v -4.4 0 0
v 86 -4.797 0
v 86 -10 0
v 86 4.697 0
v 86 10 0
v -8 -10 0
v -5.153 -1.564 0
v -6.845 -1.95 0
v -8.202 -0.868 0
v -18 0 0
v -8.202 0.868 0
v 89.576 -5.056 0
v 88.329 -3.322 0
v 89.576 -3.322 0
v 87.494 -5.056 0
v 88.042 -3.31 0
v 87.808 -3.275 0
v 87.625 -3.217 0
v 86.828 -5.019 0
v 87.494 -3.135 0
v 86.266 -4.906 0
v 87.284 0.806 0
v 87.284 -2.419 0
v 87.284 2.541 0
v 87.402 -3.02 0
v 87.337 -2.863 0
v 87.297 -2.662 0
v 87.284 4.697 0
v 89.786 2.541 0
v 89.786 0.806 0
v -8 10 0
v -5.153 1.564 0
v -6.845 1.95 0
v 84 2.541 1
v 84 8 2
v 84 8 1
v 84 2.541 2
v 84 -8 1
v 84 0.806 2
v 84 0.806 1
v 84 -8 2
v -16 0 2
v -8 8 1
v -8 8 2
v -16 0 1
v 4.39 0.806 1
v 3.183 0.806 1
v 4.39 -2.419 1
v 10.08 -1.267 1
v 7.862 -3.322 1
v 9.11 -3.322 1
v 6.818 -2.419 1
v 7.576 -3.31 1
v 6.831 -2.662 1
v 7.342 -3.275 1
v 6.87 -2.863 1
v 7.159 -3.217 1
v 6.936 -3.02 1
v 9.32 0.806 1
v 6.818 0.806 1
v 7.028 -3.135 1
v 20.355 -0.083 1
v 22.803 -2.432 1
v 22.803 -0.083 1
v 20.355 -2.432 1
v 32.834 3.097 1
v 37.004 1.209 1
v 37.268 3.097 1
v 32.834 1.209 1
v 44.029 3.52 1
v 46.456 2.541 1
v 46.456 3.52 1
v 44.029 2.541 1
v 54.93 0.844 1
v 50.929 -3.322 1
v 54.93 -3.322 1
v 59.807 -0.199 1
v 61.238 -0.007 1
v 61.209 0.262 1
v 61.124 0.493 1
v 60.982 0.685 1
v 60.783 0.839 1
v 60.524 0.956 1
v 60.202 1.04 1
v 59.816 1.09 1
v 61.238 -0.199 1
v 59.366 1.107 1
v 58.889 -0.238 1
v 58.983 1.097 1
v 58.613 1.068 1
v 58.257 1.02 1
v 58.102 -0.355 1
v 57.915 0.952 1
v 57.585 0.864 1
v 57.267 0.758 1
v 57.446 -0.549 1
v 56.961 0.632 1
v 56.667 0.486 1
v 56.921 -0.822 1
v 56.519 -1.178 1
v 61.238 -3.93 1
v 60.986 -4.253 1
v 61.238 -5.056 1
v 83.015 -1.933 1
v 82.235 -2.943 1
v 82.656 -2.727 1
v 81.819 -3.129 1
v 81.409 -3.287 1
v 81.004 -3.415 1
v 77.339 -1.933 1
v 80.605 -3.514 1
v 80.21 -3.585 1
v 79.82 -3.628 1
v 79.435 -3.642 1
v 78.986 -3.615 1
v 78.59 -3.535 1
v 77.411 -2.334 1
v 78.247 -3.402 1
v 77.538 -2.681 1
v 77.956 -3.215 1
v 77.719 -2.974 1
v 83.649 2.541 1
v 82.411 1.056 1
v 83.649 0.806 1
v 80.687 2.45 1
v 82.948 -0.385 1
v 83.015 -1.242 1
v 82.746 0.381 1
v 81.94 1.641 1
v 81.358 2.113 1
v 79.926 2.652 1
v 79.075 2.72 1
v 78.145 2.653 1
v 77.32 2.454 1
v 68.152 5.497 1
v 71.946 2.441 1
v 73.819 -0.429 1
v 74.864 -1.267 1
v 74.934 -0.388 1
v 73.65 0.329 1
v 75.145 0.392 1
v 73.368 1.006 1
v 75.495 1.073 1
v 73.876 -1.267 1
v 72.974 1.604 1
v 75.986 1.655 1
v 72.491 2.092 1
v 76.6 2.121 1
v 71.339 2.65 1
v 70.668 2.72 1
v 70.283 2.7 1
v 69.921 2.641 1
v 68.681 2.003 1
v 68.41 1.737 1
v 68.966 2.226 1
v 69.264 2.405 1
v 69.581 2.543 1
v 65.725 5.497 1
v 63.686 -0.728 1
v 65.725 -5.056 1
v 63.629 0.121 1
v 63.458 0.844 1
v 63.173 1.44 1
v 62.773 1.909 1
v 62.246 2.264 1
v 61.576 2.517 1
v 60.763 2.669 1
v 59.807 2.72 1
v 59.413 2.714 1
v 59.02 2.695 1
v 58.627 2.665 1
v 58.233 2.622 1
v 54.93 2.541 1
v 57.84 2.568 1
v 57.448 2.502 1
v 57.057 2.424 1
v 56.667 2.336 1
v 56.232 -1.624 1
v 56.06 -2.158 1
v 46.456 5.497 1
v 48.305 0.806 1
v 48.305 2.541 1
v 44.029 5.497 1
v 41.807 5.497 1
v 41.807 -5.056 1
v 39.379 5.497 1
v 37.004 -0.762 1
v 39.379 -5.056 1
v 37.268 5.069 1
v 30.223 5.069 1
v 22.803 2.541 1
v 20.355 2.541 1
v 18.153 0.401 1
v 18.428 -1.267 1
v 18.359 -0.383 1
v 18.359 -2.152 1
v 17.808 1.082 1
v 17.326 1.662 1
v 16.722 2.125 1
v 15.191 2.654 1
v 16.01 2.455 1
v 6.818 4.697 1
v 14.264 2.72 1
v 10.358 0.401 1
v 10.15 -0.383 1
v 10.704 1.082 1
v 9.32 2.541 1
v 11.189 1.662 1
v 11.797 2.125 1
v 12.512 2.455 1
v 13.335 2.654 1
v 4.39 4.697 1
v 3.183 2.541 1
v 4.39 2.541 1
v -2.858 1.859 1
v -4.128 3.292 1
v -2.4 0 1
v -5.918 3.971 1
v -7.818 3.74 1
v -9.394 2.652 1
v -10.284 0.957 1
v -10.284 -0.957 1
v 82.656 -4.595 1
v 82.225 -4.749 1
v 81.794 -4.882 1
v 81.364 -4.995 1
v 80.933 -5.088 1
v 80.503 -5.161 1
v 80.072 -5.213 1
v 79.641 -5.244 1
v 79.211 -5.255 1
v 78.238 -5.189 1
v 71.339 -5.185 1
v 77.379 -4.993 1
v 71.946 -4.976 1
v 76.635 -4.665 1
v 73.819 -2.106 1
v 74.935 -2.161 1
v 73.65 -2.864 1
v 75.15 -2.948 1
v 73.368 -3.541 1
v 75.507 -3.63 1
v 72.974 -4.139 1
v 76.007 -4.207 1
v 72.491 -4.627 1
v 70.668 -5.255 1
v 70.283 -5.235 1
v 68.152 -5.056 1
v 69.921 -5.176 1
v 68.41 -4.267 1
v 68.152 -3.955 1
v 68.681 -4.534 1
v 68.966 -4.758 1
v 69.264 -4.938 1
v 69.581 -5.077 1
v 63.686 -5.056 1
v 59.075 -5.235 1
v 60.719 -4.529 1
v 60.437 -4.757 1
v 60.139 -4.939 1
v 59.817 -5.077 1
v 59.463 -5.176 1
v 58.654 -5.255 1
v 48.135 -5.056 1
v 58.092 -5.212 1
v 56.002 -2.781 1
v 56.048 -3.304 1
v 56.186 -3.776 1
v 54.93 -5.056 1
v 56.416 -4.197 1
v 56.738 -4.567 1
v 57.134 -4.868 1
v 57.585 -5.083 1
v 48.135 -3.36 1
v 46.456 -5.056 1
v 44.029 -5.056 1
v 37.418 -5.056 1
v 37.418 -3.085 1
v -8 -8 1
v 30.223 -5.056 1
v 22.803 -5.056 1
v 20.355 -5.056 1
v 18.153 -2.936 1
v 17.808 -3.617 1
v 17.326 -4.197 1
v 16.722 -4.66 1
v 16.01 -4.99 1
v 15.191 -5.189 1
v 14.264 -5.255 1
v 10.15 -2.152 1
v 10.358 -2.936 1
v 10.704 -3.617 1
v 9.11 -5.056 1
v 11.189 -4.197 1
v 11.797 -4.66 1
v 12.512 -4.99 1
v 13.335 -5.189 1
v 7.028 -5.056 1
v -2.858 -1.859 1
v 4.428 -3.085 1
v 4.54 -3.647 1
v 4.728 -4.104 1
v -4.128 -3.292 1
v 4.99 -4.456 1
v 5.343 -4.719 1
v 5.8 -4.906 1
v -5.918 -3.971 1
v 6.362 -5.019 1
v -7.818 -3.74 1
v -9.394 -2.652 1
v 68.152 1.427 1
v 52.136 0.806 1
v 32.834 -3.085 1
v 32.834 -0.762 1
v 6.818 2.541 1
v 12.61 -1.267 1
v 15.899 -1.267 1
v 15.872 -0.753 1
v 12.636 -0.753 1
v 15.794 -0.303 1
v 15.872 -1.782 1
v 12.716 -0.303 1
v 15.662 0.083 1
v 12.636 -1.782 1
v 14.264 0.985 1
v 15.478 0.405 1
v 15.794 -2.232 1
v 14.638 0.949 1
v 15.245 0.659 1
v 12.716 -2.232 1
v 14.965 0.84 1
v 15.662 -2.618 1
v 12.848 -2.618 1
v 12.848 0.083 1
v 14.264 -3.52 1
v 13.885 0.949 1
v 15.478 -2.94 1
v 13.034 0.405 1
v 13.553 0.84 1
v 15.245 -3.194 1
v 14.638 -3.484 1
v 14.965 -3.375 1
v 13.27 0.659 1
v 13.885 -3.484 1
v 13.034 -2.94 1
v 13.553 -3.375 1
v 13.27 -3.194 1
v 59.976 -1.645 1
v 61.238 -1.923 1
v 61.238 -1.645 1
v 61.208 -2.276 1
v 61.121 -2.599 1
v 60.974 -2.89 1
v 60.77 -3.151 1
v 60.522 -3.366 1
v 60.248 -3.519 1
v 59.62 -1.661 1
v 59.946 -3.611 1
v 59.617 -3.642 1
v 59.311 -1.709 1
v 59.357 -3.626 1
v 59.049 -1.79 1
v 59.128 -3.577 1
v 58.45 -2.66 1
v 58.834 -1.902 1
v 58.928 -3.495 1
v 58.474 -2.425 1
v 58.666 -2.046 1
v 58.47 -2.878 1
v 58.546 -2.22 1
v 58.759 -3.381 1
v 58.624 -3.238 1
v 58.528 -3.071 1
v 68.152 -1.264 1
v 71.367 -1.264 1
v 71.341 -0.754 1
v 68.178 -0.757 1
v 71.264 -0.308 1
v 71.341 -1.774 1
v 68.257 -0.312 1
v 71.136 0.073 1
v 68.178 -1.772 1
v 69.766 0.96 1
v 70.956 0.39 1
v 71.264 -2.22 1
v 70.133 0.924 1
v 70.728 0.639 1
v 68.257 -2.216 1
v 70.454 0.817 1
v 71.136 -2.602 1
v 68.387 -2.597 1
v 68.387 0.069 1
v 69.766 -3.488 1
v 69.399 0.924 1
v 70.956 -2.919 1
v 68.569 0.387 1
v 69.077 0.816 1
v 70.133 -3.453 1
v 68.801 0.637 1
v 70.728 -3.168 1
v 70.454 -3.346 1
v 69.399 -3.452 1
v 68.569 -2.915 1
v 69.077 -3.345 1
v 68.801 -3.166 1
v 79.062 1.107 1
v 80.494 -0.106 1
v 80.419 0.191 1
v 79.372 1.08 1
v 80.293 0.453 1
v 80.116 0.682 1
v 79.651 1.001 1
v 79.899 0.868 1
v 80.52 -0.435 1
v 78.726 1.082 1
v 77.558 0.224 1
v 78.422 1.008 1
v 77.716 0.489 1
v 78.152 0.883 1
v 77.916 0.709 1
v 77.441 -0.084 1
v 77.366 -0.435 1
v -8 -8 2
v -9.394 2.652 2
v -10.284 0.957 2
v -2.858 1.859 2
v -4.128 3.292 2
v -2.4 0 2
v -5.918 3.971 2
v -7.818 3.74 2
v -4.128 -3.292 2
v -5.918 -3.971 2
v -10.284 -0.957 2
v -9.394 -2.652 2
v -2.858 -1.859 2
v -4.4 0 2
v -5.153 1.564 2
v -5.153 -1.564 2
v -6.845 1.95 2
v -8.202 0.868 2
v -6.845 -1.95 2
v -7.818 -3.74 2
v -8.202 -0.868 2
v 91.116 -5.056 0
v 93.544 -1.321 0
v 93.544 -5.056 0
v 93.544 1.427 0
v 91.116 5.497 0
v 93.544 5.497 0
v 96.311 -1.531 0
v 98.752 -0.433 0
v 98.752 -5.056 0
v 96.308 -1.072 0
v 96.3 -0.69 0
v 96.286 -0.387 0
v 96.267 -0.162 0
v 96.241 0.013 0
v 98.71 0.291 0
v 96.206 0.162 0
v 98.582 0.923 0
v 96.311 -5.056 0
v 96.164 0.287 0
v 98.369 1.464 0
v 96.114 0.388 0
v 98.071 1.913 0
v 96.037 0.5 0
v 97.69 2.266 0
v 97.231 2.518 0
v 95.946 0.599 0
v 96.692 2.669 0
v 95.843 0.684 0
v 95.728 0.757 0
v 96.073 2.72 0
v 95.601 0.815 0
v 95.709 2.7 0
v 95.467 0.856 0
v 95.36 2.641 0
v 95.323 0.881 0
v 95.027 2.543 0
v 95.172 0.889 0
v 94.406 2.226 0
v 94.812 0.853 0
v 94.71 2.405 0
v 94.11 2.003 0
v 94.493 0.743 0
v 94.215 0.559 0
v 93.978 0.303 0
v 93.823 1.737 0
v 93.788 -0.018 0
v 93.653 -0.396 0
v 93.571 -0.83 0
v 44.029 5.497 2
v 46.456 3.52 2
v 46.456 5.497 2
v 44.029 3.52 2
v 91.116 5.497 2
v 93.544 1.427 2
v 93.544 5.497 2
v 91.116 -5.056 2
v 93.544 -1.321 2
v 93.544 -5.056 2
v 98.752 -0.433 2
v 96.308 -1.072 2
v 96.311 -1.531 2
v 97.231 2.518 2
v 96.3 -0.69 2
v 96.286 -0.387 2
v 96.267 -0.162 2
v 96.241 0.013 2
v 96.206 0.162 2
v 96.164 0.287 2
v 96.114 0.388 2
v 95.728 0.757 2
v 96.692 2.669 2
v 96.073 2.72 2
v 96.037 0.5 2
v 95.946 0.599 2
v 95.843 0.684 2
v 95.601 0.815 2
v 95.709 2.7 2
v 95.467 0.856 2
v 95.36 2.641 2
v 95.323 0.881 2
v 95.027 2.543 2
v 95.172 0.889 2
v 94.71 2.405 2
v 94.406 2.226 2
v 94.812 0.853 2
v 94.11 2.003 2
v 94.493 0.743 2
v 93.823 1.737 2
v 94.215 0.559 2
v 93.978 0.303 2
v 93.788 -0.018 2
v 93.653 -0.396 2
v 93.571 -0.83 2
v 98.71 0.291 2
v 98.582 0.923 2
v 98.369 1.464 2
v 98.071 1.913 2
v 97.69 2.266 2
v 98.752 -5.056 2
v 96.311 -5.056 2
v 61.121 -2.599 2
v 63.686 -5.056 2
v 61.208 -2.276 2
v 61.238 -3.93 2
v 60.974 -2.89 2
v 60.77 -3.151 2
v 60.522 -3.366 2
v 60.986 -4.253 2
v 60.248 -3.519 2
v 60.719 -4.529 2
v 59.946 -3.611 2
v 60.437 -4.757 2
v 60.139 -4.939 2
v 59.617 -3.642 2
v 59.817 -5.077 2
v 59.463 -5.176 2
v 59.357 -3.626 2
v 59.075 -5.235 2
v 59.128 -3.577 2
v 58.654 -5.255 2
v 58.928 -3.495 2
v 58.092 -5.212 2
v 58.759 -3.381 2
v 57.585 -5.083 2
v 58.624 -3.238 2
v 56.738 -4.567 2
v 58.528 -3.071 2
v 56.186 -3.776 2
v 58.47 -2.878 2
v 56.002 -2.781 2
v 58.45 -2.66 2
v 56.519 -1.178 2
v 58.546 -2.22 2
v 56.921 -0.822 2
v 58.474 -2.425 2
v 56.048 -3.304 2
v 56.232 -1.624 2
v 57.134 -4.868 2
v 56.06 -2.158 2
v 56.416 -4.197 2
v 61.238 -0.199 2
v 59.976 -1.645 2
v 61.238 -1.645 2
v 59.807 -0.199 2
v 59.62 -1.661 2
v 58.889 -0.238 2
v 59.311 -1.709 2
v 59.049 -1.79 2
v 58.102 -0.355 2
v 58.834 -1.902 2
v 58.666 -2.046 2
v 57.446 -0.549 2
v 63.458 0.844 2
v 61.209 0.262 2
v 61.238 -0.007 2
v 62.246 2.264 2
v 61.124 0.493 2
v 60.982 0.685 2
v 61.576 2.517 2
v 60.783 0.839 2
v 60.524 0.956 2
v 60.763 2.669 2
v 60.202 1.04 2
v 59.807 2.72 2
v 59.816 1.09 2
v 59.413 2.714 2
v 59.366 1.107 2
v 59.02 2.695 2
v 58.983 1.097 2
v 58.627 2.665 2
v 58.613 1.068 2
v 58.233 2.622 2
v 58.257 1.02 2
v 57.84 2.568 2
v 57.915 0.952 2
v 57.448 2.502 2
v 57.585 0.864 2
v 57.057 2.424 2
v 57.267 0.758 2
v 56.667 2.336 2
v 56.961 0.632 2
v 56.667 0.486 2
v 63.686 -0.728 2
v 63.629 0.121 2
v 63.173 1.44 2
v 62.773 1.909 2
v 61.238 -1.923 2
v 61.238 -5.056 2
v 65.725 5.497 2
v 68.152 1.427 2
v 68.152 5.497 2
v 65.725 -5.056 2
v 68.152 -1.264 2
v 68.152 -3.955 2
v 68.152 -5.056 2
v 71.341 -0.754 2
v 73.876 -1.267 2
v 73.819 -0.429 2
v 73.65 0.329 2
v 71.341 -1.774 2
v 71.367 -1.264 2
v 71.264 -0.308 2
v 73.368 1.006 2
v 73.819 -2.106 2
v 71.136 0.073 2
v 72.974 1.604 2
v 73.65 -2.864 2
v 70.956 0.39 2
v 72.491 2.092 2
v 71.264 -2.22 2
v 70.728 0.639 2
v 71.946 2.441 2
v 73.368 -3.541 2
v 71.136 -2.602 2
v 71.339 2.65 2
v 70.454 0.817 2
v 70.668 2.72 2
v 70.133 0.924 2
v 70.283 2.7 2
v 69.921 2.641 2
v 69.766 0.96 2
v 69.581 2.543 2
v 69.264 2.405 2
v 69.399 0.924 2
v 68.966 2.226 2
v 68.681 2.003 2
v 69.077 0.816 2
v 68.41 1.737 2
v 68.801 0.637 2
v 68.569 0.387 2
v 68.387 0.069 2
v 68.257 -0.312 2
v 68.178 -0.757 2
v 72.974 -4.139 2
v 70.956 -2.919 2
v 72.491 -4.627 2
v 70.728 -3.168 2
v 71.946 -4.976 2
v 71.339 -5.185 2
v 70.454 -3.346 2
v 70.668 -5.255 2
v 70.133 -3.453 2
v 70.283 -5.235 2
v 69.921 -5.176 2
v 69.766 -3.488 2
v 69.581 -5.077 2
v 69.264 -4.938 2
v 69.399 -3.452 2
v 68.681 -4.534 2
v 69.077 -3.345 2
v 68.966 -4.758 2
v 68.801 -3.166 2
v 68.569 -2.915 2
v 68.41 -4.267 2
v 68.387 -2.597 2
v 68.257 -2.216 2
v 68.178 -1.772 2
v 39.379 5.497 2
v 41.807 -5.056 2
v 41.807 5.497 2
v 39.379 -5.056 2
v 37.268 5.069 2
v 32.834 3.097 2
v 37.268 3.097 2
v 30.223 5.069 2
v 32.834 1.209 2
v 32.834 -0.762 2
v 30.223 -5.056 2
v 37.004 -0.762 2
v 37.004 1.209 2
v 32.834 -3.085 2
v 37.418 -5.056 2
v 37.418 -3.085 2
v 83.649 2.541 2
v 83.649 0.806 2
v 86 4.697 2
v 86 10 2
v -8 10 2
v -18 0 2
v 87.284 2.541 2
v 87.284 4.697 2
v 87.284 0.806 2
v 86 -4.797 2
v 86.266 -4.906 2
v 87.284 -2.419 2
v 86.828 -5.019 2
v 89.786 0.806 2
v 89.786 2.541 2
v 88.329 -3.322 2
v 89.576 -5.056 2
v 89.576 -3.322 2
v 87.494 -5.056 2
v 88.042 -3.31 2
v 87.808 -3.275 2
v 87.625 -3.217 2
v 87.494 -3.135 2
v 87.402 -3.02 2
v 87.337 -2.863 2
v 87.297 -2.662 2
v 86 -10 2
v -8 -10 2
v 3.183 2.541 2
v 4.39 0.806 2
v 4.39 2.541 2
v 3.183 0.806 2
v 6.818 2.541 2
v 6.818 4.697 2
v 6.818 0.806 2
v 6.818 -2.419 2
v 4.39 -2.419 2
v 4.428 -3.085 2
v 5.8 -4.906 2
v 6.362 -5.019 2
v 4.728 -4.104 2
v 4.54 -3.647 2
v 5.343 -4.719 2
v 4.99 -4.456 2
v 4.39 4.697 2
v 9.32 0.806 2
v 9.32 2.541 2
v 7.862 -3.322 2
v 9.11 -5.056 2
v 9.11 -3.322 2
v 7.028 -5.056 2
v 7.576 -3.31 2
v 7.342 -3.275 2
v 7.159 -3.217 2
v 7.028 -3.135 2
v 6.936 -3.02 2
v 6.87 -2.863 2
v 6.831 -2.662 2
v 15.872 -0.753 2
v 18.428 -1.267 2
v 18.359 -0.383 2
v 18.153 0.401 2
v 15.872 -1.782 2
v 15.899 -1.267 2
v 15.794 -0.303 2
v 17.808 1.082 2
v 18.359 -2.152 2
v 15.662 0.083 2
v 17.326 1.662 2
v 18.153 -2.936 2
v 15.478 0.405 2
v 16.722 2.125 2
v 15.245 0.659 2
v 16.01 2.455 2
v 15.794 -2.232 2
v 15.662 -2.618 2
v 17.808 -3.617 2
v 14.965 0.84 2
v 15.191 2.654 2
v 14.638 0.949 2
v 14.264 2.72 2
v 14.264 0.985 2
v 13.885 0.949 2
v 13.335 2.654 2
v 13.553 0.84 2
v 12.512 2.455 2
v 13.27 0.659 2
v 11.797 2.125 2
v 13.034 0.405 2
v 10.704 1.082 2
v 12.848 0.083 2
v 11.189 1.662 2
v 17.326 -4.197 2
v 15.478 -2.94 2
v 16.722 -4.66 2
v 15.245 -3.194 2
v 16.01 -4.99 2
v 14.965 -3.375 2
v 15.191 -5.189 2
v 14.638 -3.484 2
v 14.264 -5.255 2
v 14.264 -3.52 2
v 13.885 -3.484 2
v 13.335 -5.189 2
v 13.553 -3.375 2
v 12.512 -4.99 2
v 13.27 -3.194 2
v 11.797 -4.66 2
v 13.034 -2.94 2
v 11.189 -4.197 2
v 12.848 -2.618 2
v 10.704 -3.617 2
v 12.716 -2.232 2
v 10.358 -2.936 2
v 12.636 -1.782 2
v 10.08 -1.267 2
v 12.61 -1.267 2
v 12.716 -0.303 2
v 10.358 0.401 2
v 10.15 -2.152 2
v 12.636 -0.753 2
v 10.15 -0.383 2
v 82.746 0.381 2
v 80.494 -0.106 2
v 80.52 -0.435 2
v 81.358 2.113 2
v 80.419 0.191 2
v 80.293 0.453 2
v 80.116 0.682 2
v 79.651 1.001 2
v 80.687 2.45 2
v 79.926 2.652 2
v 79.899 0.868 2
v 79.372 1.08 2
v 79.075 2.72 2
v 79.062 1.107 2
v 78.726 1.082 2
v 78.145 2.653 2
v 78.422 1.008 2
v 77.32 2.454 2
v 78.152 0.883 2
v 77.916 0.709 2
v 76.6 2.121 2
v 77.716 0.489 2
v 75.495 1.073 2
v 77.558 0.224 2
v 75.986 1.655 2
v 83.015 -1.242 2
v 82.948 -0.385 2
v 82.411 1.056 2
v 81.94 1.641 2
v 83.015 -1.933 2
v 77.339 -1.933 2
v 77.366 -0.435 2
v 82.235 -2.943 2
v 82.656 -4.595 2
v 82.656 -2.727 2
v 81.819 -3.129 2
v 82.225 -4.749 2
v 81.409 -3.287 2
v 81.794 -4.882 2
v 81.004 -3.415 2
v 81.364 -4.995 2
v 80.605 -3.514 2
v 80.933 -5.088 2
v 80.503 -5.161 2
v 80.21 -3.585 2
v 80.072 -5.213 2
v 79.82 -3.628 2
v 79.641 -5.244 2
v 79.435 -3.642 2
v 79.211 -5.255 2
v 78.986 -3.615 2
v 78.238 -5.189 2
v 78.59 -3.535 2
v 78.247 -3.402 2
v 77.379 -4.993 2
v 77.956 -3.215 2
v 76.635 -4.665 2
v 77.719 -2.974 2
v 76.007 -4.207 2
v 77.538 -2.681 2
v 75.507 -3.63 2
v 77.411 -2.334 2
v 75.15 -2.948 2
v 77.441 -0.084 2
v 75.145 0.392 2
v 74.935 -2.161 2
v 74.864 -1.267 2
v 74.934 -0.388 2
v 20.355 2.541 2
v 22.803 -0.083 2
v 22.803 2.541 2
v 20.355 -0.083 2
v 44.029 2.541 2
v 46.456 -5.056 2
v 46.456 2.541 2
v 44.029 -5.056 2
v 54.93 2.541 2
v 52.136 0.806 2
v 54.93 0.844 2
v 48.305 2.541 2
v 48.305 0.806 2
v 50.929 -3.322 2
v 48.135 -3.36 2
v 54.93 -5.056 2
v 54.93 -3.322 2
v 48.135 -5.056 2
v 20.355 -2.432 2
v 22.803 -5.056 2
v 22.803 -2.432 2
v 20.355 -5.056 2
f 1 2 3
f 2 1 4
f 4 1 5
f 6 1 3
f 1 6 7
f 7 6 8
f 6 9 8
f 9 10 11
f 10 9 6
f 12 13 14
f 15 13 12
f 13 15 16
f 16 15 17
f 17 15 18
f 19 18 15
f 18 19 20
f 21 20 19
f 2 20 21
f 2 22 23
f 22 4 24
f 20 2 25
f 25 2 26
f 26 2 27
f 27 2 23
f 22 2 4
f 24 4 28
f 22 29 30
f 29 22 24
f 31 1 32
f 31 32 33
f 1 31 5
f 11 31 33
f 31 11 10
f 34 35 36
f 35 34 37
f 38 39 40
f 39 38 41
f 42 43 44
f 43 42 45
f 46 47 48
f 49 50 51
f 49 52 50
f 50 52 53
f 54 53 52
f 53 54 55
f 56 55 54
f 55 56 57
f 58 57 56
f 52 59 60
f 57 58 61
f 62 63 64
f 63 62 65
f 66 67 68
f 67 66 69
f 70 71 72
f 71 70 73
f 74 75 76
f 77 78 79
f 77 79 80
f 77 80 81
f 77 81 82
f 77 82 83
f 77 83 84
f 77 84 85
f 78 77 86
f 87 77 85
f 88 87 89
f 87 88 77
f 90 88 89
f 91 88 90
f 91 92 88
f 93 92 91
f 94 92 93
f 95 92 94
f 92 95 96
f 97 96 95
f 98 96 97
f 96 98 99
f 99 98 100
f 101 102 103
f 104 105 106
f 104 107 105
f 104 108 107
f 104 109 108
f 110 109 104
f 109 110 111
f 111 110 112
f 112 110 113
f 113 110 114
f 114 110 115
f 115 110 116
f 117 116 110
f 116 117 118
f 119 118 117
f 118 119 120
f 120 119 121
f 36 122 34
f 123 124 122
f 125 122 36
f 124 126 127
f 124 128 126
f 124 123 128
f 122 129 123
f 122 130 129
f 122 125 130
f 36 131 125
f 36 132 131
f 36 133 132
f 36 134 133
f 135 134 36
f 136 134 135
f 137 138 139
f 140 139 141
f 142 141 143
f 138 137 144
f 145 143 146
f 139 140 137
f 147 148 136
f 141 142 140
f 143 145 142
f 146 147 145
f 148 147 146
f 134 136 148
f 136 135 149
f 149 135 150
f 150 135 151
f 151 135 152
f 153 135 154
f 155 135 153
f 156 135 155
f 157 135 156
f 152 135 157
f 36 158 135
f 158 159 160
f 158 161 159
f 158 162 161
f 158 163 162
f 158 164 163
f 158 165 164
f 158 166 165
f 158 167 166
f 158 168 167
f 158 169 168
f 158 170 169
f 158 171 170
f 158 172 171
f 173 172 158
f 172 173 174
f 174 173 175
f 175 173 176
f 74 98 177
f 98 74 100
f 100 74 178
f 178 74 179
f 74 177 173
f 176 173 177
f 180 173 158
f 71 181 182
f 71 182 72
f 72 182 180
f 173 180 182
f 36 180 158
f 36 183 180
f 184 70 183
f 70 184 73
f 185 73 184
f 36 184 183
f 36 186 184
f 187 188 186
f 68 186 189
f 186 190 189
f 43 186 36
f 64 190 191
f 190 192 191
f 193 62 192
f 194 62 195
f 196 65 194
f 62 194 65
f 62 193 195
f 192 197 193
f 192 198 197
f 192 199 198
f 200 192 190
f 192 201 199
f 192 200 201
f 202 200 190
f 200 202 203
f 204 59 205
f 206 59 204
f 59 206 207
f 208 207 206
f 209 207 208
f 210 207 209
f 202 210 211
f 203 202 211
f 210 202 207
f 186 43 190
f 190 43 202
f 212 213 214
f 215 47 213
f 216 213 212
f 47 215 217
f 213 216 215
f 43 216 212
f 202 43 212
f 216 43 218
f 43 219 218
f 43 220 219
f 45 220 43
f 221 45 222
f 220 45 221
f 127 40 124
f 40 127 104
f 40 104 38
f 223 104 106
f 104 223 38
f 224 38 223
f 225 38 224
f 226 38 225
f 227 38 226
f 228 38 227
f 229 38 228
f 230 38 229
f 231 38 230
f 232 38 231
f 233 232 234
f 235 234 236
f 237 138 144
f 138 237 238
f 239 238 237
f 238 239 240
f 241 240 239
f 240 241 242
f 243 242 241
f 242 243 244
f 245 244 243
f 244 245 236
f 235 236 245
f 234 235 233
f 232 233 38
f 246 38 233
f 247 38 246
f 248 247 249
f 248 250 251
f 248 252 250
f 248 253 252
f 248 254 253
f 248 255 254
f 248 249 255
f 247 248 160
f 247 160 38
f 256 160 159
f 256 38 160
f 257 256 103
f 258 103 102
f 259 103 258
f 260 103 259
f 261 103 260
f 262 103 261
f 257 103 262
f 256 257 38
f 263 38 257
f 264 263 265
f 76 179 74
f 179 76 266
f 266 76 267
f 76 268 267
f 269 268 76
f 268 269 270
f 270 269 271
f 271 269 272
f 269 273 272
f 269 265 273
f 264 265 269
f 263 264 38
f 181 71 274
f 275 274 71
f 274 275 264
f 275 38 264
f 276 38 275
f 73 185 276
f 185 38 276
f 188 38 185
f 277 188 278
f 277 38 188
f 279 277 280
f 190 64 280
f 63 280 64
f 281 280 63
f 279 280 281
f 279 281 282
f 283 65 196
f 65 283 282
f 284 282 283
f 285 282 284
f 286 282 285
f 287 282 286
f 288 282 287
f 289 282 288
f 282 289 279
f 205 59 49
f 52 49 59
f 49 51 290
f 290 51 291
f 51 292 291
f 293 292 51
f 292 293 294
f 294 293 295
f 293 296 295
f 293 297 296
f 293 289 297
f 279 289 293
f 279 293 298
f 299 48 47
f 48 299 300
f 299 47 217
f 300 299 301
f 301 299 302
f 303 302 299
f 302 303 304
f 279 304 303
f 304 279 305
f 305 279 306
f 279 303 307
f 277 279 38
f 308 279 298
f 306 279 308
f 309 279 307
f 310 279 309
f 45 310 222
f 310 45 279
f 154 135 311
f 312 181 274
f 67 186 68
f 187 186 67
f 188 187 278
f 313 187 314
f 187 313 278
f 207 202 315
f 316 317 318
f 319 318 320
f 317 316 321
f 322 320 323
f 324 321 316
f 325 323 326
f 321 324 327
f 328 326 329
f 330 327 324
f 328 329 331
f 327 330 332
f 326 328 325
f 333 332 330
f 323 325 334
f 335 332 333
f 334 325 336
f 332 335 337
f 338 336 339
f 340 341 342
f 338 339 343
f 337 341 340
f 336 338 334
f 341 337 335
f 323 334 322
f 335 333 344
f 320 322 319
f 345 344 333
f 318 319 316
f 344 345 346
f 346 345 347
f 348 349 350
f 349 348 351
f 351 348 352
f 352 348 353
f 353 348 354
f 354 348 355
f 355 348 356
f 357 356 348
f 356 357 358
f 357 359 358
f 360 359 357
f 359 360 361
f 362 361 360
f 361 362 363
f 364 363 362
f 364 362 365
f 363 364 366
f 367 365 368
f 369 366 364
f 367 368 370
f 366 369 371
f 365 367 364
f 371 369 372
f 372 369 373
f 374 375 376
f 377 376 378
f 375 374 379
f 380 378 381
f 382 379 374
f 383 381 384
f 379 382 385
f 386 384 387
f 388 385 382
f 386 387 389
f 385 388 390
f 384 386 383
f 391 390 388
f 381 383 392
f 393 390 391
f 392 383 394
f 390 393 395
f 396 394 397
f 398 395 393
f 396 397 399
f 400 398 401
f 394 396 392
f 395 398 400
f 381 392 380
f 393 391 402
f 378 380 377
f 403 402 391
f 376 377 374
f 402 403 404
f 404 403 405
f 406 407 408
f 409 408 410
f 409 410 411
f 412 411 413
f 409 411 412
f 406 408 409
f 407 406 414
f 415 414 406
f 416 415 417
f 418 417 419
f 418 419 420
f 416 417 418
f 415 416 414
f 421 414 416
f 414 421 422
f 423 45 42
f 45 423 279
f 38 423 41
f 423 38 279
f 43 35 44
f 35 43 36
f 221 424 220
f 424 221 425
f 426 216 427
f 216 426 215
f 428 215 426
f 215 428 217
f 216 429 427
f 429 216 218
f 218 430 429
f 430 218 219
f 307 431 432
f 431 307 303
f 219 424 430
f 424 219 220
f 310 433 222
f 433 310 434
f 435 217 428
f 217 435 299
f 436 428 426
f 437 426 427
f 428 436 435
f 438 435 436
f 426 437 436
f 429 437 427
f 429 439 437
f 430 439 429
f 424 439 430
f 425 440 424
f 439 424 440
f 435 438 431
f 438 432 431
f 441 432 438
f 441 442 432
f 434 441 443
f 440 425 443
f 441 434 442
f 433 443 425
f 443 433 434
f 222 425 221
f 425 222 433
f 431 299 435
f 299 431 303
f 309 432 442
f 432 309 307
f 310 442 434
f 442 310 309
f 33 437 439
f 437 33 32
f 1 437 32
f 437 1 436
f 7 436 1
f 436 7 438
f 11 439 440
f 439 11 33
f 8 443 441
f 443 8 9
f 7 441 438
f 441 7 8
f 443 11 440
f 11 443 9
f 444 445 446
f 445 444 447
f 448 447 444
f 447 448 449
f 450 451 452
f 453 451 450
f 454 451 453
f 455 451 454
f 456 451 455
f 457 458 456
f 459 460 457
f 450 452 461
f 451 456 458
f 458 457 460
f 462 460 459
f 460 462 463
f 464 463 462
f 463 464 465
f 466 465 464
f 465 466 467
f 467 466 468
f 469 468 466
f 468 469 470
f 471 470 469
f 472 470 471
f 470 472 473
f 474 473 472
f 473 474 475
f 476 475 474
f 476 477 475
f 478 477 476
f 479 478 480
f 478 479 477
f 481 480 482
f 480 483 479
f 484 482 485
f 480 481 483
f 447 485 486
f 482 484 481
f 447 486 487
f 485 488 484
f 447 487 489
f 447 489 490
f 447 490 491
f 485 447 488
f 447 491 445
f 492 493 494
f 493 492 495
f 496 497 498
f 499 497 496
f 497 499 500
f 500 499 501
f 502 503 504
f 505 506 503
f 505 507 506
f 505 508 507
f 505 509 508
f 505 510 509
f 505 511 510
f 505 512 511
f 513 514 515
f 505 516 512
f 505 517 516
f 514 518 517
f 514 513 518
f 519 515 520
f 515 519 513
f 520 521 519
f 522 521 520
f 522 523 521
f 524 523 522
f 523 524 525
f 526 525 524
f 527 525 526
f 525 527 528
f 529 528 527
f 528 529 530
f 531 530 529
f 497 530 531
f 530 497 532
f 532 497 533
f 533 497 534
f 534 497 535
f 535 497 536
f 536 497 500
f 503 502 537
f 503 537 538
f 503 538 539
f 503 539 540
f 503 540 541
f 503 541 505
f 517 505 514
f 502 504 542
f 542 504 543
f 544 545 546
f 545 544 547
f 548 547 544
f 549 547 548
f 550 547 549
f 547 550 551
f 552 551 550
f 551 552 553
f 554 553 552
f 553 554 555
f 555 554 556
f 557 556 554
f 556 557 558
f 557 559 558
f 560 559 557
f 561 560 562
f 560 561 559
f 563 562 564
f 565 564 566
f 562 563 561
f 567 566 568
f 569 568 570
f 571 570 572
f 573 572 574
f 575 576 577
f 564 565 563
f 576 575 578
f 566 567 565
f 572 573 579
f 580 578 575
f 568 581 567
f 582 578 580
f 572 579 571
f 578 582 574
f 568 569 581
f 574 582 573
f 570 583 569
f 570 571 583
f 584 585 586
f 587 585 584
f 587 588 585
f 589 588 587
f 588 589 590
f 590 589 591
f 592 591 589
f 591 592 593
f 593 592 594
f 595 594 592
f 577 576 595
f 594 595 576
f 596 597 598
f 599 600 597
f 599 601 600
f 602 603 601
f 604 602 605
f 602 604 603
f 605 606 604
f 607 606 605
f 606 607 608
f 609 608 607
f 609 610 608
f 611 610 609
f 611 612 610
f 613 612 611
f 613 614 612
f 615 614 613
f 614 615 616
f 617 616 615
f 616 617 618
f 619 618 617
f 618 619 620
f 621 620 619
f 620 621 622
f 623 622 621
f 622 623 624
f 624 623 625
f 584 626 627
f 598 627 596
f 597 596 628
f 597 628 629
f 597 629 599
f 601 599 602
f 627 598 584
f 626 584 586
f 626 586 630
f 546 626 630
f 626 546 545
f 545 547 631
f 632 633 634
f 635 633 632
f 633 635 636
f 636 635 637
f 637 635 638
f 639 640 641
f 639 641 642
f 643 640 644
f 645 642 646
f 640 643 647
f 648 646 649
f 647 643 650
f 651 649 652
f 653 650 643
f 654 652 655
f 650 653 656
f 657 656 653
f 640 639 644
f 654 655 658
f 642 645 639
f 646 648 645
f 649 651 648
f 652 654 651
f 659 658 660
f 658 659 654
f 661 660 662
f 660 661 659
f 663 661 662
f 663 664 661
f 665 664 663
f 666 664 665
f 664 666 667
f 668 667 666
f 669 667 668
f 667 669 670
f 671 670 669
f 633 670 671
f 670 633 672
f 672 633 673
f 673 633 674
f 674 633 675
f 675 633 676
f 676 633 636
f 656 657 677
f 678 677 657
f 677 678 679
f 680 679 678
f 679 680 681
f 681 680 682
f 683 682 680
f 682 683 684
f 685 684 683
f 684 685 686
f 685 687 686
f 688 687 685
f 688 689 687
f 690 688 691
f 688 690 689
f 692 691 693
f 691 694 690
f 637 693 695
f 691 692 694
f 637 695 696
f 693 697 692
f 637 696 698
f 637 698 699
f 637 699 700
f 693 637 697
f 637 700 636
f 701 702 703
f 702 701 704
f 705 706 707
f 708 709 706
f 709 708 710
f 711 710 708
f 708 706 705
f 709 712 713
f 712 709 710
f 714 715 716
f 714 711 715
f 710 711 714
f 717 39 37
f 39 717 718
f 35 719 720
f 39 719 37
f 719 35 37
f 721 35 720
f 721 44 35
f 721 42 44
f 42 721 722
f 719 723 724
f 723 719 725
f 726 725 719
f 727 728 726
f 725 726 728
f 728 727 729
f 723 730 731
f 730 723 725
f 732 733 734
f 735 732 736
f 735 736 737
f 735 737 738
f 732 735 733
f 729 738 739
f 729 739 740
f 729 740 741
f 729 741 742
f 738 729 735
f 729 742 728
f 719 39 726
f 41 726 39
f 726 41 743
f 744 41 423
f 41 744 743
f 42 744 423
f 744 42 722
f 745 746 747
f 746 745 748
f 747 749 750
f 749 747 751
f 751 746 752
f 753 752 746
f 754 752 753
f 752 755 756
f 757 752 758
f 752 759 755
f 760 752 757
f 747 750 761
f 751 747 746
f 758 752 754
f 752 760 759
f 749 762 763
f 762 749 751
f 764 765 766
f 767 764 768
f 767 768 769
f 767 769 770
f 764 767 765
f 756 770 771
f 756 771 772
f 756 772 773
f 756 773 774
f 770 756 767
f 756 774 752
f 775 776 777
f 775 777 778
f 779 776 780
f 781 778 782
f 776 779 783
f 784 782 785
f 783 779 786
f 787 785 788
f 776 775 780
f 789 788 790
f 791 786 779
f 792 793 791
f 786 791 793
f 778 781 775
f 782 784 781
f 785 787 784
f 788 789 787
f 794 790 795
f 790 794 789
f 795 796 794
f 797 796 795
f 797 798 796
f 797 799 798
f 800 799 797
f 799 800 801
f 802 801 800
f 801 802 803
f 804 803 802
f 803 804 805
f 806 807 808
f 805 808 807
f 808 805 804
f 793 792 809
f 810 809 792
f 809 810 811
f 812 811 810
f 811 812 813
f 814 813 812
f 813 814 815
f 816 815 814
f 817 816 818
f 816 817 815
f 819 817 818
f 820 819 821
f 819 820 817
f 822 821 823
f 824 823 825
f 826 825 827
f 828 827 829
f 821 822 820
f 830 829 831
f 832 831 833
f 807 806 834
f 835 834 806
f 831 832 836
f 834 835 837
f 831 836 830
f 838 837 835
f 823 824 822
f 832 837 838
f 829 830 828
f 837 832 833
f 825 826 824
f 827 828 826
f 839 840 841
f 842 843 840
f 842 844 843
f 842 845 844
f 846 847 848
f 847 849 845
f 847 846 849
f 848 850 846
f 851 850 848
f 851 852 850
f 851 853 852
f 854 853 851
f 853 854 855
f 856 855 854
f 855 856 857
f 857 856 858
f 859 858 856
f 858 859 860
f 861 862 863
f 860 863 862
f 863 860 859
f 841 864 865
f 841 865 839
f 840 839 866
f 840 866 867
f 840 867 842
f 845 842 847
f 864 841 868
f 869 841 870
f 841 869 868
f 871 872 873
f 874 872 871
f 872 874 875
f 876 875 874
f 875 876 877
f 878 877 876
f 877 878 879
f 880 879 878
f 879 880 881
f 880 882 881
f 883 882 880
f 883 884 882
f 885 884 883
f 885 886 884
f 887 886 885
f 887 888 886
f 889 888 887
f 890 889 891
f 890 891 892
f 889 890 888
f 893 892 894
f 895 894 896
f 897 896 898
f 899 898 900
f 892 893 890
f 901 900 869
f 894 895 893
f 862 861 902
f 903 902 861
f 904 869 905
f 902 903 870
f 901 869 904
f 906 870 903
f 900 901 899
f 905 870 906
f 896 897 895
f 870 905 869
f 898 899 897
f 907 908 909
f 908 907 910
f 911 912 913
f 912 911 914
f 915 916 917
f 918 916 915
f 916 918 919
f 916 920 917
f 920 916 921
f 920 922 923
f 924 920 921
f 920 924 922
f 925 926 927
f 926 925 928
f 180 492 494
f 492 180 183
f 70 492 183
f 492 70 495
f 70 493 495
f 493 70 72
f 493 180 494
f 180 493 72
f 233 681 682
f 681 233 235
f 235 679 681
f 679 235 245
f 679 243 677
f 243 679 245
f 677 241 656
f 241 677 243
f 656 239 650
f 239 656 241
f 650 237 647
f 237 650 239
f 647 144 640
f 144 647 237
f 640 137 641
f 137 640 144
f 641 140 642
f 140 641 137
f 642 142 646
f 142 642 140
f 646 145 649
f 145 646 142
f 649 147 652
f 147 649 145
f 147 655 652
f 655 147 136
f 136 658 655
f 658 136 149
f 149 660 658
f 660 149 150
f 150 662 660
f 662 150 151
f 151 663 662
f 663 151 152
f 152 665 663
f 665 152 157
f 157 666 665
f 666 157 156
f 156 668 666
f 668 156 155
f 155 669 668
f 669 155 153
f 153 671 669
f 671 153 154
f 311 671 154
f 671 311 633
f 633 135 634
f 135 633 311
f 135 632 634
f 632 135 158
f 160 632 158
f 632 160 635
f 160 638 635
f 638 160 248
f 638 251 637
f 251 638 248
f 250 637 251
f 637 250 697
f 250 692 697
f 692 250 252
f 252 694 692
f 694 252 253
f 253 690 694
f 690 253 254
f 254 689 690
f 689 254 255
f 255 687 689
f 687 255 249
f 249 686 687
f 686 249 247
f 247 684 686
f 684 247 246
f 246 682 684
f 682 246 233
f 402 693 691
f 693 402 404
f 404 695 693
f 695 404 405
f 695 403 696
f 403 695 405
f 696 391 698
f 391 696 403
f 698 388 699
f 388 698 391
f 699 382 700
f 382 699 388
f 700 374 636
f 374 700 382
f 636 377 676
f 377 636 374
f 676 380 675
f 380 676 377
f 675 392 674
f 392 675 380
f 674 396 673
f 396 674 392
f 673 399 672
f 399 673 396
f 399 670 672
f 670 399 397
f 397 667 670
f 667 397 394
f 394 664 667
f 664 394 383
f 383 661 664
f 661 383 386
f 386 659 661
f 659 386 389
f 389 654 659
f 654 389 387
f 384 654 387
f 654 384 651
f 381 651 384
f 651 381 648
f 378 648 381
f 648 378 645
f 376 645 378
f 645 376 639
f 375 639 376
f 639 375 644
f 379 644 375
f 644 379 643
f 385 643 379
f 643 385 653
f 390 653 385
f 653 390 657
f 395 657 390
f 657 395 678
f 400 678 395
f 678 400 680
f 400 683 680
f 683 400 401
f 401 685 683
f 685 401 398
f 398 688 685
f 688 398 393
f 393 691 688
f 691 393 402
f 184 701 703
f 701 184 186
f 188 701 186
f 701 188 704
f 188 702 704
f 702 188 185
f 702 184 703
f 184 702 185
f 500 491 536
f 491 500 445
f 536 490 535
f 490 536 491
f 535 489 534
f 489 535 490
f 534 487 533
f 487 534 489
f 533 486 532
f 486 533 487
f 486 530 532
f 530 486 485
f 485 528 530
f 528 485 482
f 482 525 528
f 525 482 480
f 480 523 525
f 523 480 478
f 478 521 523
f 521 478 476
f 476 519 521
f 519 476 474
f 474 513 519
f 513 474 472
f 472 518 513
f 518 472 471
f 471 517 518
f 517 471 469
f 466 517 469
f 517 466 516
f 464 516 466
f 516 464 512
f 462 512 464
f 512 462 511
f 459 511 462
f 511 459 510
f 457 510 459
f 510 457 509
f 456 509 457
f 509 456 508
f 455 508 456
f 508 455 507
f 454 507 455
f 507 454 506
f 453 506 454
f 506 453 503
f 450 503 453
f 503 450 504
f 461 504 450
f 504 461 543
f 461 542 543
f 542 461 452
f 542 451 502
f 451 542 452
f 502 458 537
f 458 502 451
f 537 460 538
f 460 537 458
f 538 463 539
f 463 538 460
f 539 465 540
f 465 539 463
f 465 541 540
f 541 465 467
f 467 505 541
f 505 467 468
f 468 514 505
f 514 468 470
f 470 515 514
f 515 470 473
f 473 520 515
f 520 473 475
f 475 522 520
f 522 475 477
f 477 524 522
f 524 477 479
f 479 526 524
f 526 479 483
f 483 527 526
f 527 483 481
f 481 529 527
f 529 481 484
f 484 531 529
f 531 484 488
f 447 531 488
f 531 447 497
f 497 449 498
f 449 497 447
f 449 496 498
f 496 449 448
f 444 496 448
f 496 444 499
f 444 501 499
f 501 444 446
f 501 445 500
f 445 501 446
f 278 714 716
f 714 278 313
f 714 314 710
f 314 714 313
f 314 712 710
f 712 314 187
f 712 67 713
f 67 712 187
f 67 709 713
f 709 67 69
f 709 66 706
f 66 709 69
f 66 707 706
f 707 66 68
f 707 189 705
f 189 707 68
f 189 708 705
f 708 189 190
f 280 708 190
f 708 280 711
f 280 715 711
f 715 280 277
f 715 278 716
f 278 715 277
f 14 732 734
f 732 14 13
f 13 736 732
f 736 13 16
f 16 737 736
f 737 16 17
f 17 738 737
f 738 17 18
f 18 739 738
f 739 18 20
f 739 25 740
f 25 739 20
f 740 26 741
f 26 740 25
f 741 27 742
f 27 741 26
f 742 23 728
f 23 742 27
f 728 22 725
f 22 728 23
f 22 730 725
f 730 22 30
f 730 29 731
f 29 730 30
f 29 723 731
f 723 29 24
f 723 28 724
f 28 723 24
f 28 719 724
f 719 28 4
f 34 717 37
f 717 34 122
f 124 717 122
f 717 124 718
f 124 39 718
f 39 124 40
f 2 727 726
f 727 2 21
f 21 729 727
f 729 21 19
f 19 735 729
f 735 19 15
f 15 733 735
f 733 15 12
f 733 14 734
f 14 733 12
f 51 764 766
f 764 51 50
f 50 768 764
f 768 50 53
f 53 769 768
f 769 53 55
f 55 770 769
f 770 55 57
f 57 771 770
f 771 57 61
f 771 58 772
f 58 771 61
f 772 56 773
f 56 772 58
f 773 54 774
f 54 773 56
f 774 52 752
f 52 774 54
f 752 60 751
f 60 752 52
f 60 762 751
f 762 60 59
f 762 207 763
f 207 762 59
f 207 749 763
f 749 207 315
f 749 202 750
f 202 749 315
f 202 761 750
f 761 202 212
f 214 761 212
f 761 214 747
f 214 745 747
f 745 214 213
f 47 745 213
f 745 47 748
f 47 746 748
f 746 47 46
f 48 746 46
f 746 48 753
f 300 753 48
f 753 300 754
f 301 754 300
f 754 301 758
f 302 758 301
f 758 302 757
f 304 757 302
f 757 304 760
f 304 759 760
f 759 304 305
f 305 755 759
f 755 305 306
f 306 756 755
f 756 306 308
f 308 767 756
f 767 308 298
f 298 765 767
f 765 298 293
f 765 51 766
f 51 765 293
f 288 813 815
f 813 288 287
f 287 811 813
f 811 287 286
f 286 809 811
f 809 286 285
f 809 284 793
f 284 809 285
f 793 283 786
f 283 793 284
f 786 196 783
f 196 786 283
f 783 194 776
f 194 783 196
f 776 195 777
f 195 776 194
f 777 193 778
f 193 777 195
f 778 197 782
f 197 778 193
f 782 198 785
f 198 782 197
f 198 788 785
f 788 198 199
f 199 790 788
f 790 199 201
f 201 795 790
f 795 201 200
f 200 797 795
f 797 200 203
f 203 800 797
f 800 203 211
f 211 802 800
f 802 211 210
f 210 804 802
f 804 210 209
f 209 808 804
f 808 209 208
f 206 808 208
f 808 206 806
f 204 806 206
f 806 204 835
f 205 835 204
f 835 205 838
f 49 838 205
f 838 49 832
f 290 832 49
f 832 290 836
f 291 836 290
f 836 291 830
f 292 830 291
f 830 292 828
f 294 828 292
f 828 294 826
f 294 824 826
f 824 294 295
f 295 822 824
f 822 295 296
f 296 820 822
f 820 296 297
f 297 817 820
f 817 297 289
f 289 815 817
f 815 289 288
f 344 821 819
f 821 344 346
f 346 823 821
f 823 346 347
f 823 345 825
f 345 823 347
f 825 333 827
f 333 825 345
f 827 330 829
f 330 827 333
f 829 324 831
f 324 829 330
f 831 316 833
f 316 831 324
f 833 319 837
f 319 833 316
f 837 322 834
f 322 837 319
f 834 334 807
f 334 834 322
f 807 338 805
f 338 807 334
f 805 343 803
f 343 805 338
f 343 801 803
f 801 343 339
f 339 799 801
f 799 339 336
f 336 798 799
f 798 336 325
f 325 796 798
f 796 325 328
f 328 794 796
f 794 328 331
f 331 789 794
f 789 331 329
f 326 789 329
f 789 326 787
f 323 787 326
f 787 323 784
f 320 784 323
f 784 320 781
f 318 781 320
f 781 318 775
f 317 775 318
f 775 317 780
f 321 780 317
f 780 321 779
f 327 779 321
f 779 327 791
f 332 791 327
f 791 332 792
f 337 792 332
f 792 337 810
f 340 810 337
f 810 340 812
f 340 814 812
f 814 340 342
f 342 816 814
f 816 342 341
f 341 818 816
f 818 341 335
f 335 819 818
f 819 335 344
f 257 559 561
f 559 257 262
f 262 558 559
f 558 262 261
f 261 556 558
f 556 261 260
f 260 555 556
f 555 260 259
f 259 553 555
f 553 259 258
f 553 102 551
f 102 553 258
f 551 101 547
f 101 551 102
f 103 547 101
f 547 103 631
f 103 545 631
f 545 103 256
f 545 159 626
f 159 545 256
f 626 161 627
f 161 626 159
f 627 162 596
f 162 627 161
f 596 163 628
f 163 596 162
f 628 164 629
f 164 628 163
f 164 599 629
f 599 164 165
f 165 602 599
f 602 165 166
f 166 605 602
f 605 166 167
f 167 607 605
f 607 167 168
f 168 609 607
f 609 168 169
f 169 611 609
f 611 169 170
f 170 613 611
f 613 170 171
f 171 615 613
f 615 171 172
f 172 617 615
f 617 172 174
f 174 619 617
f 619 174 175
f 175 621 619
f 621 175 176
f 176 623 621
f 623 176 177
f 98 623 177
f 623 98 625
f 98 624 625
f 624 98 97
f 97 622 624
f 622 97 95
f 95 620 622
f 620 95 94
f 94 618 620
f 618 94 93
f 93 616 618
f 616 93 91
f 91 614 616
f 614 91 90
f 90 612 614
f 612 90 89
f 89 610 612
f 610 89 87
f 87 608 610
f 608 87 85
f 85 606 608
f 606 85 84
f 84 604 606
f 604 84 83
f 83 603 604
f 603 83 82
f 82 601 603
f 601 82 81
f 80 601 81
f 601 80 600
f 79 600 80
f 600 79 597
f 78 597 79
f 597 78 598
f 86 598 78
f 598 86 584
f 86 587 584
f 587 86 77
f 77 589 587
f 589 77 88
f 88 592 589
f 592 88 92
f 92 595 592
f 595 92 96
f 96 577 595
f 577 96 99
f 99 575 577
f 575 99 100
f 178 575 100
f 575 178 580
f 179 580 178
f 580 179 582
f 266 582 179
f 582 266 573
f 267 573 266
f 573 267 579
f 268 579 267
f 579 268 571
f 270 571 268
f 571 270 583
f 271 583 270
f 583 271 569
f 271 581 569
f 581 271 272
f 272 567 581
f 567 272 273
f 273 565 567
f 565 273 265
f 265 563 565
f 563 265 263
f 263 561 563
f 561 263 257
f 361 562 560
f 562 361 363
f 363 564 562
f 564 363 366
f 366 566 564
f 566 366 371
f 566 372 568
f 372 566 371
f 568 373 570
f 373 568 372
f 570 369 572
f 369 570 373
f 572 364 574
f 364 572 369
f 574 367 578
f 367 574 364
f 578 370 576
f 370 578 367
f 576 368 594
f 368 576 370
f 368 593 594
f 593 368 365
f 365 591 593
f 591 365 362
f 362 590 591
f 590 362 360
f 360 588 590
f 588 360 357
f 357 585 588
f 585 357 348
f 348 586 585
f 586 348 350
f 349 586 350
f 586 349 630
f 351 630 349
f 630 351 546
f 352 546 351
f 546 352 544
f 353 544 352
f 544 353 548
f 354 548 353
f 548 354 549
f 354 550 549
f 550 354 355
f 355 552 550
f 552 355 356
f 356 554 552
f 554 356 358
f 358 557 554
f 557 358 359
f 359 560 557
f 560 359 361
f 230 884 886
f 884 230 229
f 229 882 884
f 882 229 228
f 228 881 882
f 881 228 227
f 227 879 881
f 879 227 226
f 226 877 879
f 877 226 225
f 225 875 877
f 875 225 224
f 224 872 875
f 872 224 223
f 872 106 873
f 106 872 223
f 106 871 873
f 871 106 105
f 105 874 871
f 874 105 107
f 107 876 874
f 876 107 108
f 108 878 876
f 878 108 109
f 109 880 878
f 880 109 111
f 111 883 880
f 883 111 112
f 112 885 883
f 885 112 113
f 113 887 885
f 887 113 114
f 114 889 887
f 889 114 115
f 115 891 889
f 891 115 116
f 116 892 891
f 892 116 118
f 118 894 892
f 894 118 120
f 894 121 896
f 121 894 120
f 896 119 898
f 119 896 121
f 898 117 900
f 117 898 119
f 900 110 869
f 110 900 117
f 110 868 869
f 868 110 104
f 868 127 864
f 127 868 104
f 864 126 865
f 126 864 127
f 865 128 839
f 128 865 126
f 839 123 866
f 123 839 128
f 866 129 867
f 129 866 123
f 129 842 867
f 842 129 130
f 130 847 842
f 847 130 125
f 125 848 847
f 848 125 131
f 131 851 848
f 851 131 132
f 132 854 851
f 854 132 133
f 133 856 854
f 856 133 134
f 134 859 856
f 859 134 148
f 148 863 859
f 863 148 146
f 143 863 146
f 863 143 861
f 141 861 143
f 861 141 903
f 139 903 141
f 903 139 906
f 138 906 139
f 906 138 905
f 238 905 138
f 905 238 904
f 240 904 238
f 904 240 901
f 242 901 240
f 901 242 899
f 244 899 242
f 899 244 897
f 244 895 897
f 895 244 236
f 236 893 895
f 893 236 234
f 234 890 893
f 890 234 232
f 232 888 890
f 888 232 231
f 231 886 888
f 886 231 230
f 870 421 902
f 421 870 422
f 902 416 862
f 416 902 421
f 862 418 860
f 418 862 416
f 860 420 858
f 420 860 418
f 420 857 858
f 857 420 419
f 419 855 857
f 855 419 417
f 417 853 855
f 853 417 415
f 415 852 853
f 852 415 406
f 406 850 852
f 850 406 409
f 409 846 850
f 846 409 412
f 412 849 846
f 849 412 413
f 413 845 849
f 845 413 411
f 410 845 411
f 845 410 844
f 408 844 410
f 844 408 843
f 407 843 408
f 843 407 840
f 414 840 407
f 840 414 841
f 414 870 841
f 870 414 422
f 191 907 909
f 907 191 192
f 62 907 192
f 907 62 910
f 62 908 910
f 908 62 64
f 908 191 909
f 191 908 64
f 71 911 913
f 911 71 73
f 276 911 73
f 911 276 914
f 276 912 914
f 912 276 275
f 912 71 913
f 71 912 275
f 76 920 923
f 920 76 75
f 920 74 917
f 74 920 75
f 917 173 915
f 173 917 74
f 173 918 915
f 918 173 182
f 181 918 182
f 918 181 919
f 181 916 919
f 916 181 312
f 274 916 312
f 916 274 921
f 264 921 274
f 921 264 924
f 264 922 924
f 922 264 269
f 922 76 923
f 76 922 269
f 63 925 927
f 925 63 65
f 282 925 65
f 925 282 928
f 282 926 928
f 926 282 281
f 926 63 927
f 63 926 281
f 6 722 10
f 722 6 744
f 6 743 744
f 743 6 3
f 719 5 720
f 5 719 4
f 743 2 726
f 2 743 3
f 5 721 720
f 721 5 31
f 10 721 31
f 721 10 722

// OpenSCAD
/* [Customize] */

// the words that will appear on your tag.
tag_text = "to: Elizabeth";
// the font to render
font_name = "Nunito"; // [Roboto,Bungee,Noto Sans,Nunito,Oswald]
// the length of the tag in mm (x axis)
tag_length = 84;
// the height of the tag in mm (y axis)
tag_height = 16;
// the depth of the tag base in mm (z axis)
tag_depth = 1;
// the depth of the text in mm (must be > tag_depth, is 2x by default)
text_depth = tag_depth*2;
// how much space between the text and the edge
text_border=3;
// how wide to make the tag border
tag_border=2;


// preview[view:south, tilt:top]

// Model - Start

bold_font_name = str(font_name,":style=Bold");

//Arial Rounded MT Bold is a great 3d printer font. Sadly not available on thingiverse
//bold_font_name = "Arial Rounded MT Bold";

tag_points = [
    [tag_length,-1*(tag_height/2)], 
    [-1*(tag_height/2), -1*(tag_height/2)],
    [-1*(tag_height),0],
    [-1*(tag_height/2),tag_height/2], 
    [tag_length, tag_height/2]];

difference() {
    union() {
        linear_extrude(height=tag_depth) {
            polygon(points=tag_points);
        }
        translate([(-1*(tag_height/2))+(tag_height/5/2),0,0]) {
            cylinder(r=(tag_border*2),h=text_depth);
        }
    }
    translate([(-1*(tag_height/2))+(tag_height/5/2),0,0]) {
        cylinder(r=tag_border,h=text_depth*2);
    }
}
    
translate([text_border,0,0]) {
    linear_extrude(height = text_depth) {
        text(tag_text,font=bold_font_name, size=tag_height-text_border*2, valign="center");
        }
}

linear_extrude(height = text_depth) {
    polygon(points=[
    [tag_points[0][0], tag_points[0][1]],
    [tag_points[0][0], tag_points[0][1]-tag_border],
    [tag_points[1][0], tag_points[1][1]-tag_border],
    [tag_points[1][0], tag_points[1][1]],
    ]);

    polygon(points=[
    [tag_points[1][0], tag_points[1][1]],
    [tag_points[1][0], tag_points[1][1]-tag_border],
    [tag_points[2][0]-tag_border, tag_points[2][1]],
    [tag_points[2][0], tag_points[2][1]],
    ]);

    polygon(points=[
    [tag_points[2][0], tag_points[2][1]],
    [tag_points[2][0]-tag_border, tag_points[2][1]],
    [tag_points[3][0], tag_points[3][1]+tag_border],
    [tag_points[3][0], tag_points[3][1]],
    ]);

    polygon(points=[
    [tag_points[3][0], tag_points[3][1]+tag_border],
    [tag_points[3][0], tag_points[3][1]],
    [tag_points[4][0], tag_points[4][1]],
    [tag_points[4][0], tag_points[4][1]+tag_border],
    ]);

    polygon(points=[
    [tag_points[4][0], tag_points[4][1]+tag_border],
    [tag_points[4][0]+tag_border, tag_points[4][1]+tag_border],
    [tag_points[0][0]+tag_border, tag_points[0][1]-tag_border],
    [tag_points[0][0], tag_points[0][1]-tag_border],
    ]);
}
